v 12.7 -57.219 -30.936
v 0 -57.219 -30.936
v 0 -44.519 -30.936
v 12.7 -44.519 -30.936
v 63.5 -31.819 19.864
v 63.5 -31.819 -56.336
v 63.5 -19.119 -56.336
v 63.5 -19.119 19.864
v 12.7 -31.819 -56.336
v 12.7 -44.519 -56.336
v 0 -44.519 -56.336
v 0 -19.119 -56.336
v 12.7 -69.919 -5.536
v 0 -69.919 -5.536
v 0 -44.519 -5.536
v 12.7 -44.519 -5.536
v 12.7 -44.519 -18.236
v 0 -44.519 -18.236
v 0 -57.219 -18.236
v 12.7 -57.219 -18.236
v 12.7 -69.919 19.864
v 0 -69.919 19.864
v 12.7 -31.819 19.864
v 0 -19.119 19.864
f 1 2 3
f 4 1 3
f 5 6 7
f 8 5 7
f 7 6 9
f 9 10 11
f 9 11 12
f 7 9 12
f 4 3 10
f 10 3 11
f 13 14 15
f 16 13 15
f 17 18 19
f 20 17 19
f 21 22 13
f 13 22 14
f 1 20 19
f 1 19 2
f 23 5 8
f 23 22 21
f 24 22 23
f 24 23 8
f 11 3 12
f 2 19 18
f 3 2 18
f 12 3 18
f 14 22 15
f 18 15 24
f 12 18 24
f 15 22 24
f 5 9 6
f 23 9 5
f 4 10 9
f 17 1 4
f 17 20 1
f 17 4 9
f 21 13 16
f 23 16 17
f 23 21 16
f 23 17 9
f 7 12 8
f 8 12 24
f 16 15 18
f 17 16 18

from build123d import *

# Parameters (mm, degrees)
F1_DEPTH = 12.7
F2_W     = 12.7
F2_H     = 76.2
F3_DEPTH = 50.8


with BuildPart() as f1:
    # F0 (on Right) → F1 (new body)
    with BuildSketch(Plane.YZ):
        Polygon((-44.519397, -30.93571), (-44.519397, -56.33571), (-31.819397, -56.33571), (-19.119397, -56.33571), (-19.119397, 19.86429), (-69.919397, 19.86429), (-69.919397, -5.53571), (-44.519397, -5.53571), (-44.519397, -18.23571), (-57.219397, -18.23571), (-57.219397, -30.93571), align=None)
    extrude(amount=F1_DEPTH)

    # F2 (on face) → F3 (join)
    with BuildSketch(Plane.YZ.offset(12.7)):
        with Locations((-25.469397, -18.23571)):
            Rectangle(F2_W, F2_H)
    extrude(amount=F3_DEPTH)


solid = f1.part
